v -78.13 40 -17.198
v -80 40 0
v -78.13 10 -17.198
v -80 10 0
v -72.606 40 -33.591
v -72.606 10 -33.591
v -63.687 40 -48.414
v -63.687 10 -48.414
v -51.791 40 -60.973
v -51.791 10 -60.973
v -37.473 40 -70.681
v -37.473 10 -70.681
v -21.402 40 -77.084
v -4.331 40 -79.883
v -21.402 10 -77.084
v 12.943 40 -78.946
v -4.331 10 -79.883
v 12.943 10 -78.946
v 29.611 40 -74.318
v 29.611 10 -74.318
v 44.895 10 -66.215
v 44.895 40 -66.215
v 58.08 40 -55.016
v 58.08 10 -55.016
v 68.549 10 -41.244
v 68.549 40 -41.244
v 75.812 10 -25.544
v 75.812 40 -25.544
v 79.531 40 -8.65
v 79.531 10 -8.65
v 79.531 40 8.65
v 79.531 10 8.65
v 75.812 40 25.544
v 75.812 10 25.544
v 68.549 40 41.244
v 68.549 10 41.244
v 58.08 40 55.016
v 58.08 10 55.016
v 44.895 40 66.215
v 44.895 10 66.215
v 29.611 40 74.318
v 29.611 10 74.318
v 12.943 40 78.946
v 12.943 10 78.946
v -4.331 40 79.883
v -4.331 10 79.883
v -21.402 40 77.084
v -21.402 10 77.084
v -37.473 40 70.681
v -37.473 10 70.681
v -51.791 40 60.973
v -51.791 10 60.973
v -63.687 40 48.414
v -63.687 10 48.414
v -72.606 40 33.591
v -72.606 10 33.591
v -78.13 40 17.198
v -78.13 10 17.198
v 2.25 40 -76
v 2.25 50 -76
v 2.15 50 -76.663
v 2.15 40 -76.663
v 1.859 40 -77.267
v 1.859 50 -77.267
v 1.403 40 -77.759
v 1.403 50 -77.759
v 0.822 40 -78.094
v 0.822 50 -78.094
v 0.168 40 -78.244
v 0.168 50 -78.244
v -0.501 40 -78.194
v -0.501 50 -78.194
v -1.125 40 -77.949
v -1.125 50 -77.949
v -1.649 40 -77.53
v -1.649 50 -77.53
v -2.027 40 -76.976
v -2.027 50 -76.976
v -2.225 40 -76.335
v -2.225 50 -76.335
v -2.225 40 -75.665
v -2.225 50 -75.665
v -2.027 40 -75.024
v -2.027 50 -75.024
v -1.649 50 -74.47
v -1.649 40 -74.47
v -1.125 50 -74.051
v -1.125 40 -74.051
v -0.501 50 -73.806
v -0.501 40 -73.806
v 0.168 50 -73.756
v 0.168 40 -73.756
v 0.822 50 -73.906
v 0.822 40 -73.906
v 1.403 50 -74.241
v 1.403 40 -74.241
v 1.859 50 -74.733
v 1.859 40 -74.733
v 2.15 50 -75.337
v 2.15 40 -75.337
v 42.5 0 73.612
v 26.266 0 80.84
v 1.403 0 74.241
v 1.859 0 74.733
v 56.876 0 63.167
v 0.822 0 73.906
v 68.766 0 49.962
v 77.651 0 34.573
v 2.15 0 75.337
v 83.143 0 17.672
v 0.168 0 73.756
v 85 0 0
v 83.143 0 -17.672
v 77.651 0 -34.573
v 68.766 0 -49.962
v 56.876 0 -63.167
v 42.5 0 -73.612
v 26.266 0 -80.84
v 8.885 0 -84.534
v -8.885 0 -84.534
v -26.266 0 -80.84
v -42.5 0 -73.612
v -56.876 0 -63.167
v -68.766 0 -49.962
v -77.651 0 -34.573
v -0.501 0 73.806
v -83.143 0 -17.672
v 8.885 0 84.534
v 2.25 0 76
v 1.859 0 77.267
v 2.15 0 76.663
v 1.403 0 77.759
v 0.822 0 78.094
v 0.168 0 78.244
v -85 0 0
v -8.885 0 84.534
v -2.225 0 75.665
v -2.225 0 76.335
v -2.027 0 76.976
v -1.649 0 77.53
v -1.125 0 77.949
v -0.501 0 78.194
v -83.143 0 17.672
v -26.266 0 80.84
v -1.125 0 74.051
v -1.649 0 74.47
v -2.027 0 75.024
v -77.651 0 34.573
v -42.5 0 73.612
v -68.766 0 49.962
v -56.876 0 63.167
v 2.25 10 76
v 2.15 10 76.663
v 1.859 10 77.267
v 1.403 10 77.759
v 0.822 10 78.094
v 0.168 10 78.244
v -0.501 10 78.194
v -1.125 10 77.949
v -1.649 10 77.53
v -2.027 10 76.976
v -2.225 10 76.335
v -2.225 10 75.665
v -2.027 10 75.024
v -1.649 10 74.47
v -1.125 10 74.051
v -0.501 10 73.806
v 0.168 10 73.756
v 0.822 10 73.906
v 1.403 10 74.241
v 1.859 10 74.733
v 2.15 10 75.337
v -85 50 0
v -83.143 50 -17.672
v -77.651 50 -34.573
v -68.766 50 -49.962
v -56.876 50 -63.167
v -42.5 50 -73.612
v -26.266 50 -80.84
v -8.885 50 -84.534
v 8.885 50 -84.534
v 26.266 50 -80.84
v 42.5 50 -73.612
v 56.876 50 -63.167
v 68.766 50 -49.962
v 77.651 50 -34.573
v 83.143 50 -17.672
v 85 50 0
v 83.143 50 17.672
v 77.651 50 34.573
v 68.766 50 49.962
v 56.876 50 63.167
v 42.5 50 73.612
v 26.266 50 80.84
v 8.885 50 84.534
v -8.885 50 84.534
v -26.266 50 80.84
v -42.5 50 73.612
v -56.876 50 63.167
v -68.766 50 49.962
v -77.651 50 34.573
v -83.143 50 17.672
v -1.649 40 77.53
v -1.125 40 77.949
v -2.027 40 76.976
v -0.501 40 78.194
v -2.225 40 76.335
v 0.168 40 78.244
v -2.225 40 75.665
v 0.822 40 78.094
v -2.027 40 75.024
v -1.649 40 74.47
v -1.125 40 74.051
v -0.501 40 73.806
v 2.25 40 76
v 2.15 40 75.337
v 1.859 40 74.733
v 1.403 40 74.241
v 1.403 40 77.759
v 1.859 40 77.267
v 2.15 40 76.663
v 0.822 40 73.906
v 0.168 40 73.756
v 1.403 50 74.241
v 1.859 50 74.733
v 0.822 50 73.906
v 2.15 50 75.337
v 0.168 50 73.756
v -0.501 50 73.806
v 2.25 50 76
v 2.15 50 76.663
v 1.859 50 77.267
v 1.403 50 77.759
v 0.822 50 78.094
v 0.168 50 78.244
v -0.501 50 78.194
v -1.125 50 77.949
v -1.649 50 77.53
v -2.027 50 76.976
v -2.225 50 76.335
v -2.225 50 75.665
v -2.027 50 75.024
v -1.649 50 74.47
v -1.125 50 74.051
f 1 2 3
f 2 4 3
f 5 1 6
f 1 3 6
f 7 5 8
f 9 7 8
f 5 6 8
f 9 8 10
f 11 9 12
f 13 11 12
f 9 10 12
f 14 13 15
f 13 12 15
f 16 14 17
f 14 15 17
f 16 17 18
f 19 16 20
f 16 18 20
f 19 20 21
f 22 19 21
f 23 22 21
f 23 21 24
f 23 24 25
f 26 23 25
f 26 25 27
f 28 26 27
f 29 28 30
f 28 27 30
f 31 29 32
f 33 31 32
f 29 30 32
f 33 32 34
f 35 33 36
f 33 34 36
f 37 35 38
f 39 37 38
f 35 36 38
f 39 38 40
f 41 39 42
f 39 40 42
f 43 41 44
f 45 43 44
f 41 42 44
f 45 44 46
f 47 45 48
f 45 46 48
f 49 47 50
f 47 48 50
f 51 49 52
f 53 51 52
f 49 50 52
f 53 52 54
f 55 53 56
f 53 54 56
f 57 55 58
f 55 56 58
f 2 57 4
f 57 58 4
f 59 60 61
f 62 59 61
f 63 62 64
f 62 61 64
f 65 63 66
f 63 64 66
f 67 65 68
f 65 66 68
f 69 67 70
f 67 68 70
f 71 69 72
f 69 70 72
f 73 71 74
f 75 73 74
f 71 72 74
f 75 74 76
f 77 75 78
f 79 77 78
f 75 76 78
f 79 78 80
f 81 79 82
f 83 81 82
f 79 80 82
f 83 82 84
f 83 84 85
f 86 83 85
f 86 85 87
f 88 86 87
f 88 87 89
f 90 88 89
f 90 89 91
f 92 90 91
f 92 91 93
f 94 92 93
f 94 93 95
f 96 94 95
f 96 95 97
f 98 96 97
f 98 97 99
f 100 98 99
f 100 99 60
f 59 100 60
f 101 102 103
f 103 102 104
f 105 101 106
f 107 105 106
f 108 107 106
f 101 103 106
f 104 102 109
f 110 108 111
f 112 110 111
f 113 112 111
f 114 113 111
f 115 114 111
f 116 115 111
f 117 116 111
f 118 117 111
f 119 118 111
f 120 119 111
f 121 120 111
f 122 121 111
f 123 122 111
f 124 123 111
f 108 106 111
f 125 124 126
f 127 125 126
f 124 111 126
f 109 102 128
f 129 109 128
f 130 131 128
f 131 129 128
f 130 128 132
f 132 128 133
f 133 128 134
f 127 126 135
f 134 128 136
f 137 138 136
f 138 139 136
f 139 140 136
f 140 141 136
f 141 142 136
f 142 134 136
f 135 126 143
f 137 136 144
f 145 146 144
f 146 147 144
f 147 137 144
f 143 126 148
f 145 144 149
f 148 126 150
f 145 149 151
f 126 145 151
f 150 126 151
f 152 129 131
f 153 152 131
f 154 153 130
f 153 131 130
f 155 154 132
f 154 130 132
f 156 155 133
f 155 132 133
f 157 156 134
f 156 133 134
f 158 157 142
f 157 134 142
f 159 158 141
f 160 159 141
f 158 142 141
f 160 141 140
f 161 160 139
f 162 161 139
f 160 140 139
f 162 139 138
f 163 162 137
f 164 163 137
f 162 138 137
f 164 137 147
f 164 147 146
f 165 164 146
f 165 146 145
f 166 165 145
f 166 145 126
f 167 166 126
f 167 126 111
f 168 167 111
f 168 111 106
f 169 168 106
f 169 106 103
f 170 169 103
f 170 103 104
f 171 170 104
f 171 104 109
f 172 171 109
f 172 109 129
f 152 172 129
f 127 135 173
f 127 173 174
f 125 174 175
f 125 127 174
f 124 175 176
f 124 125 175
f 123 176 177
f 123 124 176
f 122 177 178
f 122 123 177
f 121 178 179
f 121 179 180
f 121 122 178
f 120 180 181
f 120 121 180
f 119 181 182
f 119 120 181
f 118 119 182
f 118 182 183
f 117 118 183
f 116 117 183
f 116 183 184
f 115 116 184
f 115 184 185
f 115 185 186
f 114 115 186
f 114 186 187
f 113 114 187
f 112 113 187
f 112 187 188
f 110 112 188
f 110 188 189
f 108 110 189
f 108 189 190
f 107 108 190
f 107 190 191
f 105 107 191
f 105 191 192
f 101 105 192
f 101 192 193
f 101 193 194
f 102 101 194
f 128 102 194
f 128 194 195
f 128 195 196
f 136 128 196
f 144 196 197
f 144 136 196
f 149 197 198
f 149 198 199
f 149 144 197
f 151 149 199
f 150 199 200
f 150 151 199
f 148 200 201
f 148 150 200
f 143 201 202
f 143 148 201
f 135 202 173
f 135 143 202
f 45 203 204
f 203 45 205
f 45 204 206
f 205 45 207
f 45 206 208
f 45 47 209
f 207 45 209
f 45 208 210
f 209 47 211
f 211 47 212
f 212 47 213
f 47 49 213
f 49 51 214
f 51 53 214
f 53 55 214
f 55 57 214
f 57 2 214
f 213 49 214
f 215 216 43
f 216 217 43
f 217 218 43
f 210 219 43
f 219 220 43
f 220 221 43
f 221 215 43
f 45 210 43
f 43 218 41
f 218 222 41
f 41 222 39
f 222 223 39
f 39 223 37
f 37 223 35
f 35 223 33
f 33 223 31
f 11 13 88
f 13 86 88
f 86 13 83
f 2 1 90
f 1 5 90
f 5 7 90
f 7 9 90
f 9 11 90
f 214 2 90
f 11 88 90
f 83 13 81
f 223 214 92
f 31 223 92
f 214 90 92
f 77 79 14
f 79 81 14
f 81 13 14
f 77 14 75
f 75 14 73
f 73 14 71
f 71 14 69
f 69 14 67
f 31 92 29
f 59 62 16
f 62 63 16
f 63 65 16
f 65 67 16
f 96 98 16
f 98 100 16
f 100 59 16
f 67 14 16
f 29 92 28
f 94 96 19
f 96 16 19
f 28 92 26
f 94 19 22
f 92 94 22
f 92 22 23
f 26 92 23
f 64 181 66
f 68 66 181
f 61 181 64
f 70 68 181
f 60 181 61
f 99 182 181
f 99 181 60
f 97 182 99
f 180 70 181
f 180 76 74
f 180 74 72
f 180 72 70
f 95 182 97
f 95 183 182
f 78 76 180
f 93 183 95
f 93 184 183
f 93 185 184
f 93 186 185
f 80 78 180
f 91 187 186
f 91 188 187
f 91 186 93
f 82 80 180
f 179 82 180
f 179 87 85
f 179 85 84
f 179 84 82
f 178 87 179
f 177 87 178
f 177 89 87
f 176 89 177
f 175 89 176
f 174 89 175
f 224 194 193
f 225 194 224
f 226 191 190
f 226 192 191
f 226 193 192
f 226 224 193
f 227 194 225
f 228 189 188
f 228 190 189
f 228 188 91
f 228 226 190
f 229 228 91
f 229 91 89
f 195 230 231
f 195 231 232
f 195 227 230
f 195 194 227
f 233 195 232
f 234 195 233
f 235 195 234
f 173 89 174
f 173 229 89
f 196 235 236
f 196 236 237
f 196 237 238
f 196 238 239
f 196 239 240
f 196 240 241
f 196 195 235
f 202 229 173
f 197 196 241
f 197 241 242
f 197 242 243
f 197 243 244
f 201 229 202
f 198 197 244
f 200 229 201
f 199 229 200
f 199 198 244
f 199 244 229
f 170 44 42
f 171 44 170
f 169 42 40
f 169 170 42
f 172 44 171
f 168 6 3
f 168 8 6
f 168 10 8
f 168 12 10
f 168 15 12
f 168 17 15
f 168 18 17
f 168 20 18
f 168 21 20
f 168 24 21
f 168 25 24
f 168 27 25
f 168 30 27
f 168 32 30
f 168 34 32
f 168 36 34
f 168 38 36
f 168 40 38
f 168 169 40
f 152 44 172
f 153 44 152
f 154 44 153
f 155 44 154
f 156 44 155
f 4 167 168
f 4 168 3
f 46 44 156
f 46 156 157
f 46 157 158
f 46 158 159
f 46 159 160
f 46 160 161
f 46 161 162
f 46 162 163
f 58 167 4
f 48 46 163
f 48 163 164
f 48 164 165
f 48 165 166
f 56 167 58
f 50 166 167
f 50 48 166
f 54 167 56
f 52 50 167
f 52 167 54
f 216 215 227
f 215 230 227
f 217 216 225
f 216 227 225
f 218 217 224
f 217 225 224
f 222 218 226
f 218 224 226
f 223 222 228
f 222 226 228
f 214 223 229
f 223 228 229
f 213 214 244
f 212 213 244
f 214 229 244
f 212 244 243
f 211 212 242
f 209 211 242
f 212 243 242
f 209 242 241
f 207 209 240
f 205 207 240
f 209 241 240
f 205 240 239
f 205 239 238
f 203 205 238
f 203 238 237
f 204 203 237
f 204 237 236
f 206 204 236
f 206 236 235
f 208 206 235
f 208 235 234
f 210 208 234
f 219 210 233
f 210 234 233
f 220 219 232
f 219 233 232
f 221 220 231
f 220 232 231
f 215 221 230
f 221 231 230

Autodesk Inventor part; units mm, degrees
ref_plane "YZ Plane" through (0, 0, 0) normal (1, 0, 0) x (0, 1, 0)
ref_plane "XZ Plane" through (0, 0, 0) normal (0, 1, 0) x (-1, 0, 0)
ref_plane "XY Plane" through (0, 0, 0) normal (0, 0, 1) x (1, 0, 0)
sketch "Sketch1" plane through (0, 0, 0) normal (0, 1, 0) x (-1, 0, 0)
  circle A0 centre (0, 0) radius 85
  circle A1 centre (0, 0) radius 80
  dimension "d0" = 170
  dimension "d1" = 160
extrude "Extrusion1" add sketch "Sketch1" along normal blind 10 contours A0 | A1
extrude "Extrusion2" add sketch "Sketch1" along normal blind 50
sketch "Sketch2" plane through (0, 50, 0) normal (0, 1, 0) x (1, 0, 0)
  circle A0 centre (0, 0) radius 85
extrude "Extrusion3" add sketch "Sketch2" against normal blind 10
sketch "Sketch3" plane through (0, 50, 0) normal (0, 1, 0) x (1, 0, 0)
  circle A0 centre (0, 0) radius 76
  circle A1 centre (0, -76) radius 2.25
  circle A2 centre (0, 76) radius 2.25
  dimension "d8" = 152
  dimension "d9" = 4.5
  dimension "d10" = 4.5
extrude "Extrusion4" cut sketch "Sketch3" against normal blind 10 contours A2 A0 | A0 A2 | A1 A0 | A0 A1
sketch "Sketch4" plane through (0, 0, 0) normal (0, -1, 0) x (1, 0, 0)
  circle A0 centre (0, -76) radius 2.25 projected
  circle A1 centre (0, 0) radius 76
  circle A2 centre (0, 76) radius 2.25
extrude "Extrusion5" cut sketch "Sketch4" against normal blind 10 contours A2 A1 | A1 A2
properties part number "Capsule"
